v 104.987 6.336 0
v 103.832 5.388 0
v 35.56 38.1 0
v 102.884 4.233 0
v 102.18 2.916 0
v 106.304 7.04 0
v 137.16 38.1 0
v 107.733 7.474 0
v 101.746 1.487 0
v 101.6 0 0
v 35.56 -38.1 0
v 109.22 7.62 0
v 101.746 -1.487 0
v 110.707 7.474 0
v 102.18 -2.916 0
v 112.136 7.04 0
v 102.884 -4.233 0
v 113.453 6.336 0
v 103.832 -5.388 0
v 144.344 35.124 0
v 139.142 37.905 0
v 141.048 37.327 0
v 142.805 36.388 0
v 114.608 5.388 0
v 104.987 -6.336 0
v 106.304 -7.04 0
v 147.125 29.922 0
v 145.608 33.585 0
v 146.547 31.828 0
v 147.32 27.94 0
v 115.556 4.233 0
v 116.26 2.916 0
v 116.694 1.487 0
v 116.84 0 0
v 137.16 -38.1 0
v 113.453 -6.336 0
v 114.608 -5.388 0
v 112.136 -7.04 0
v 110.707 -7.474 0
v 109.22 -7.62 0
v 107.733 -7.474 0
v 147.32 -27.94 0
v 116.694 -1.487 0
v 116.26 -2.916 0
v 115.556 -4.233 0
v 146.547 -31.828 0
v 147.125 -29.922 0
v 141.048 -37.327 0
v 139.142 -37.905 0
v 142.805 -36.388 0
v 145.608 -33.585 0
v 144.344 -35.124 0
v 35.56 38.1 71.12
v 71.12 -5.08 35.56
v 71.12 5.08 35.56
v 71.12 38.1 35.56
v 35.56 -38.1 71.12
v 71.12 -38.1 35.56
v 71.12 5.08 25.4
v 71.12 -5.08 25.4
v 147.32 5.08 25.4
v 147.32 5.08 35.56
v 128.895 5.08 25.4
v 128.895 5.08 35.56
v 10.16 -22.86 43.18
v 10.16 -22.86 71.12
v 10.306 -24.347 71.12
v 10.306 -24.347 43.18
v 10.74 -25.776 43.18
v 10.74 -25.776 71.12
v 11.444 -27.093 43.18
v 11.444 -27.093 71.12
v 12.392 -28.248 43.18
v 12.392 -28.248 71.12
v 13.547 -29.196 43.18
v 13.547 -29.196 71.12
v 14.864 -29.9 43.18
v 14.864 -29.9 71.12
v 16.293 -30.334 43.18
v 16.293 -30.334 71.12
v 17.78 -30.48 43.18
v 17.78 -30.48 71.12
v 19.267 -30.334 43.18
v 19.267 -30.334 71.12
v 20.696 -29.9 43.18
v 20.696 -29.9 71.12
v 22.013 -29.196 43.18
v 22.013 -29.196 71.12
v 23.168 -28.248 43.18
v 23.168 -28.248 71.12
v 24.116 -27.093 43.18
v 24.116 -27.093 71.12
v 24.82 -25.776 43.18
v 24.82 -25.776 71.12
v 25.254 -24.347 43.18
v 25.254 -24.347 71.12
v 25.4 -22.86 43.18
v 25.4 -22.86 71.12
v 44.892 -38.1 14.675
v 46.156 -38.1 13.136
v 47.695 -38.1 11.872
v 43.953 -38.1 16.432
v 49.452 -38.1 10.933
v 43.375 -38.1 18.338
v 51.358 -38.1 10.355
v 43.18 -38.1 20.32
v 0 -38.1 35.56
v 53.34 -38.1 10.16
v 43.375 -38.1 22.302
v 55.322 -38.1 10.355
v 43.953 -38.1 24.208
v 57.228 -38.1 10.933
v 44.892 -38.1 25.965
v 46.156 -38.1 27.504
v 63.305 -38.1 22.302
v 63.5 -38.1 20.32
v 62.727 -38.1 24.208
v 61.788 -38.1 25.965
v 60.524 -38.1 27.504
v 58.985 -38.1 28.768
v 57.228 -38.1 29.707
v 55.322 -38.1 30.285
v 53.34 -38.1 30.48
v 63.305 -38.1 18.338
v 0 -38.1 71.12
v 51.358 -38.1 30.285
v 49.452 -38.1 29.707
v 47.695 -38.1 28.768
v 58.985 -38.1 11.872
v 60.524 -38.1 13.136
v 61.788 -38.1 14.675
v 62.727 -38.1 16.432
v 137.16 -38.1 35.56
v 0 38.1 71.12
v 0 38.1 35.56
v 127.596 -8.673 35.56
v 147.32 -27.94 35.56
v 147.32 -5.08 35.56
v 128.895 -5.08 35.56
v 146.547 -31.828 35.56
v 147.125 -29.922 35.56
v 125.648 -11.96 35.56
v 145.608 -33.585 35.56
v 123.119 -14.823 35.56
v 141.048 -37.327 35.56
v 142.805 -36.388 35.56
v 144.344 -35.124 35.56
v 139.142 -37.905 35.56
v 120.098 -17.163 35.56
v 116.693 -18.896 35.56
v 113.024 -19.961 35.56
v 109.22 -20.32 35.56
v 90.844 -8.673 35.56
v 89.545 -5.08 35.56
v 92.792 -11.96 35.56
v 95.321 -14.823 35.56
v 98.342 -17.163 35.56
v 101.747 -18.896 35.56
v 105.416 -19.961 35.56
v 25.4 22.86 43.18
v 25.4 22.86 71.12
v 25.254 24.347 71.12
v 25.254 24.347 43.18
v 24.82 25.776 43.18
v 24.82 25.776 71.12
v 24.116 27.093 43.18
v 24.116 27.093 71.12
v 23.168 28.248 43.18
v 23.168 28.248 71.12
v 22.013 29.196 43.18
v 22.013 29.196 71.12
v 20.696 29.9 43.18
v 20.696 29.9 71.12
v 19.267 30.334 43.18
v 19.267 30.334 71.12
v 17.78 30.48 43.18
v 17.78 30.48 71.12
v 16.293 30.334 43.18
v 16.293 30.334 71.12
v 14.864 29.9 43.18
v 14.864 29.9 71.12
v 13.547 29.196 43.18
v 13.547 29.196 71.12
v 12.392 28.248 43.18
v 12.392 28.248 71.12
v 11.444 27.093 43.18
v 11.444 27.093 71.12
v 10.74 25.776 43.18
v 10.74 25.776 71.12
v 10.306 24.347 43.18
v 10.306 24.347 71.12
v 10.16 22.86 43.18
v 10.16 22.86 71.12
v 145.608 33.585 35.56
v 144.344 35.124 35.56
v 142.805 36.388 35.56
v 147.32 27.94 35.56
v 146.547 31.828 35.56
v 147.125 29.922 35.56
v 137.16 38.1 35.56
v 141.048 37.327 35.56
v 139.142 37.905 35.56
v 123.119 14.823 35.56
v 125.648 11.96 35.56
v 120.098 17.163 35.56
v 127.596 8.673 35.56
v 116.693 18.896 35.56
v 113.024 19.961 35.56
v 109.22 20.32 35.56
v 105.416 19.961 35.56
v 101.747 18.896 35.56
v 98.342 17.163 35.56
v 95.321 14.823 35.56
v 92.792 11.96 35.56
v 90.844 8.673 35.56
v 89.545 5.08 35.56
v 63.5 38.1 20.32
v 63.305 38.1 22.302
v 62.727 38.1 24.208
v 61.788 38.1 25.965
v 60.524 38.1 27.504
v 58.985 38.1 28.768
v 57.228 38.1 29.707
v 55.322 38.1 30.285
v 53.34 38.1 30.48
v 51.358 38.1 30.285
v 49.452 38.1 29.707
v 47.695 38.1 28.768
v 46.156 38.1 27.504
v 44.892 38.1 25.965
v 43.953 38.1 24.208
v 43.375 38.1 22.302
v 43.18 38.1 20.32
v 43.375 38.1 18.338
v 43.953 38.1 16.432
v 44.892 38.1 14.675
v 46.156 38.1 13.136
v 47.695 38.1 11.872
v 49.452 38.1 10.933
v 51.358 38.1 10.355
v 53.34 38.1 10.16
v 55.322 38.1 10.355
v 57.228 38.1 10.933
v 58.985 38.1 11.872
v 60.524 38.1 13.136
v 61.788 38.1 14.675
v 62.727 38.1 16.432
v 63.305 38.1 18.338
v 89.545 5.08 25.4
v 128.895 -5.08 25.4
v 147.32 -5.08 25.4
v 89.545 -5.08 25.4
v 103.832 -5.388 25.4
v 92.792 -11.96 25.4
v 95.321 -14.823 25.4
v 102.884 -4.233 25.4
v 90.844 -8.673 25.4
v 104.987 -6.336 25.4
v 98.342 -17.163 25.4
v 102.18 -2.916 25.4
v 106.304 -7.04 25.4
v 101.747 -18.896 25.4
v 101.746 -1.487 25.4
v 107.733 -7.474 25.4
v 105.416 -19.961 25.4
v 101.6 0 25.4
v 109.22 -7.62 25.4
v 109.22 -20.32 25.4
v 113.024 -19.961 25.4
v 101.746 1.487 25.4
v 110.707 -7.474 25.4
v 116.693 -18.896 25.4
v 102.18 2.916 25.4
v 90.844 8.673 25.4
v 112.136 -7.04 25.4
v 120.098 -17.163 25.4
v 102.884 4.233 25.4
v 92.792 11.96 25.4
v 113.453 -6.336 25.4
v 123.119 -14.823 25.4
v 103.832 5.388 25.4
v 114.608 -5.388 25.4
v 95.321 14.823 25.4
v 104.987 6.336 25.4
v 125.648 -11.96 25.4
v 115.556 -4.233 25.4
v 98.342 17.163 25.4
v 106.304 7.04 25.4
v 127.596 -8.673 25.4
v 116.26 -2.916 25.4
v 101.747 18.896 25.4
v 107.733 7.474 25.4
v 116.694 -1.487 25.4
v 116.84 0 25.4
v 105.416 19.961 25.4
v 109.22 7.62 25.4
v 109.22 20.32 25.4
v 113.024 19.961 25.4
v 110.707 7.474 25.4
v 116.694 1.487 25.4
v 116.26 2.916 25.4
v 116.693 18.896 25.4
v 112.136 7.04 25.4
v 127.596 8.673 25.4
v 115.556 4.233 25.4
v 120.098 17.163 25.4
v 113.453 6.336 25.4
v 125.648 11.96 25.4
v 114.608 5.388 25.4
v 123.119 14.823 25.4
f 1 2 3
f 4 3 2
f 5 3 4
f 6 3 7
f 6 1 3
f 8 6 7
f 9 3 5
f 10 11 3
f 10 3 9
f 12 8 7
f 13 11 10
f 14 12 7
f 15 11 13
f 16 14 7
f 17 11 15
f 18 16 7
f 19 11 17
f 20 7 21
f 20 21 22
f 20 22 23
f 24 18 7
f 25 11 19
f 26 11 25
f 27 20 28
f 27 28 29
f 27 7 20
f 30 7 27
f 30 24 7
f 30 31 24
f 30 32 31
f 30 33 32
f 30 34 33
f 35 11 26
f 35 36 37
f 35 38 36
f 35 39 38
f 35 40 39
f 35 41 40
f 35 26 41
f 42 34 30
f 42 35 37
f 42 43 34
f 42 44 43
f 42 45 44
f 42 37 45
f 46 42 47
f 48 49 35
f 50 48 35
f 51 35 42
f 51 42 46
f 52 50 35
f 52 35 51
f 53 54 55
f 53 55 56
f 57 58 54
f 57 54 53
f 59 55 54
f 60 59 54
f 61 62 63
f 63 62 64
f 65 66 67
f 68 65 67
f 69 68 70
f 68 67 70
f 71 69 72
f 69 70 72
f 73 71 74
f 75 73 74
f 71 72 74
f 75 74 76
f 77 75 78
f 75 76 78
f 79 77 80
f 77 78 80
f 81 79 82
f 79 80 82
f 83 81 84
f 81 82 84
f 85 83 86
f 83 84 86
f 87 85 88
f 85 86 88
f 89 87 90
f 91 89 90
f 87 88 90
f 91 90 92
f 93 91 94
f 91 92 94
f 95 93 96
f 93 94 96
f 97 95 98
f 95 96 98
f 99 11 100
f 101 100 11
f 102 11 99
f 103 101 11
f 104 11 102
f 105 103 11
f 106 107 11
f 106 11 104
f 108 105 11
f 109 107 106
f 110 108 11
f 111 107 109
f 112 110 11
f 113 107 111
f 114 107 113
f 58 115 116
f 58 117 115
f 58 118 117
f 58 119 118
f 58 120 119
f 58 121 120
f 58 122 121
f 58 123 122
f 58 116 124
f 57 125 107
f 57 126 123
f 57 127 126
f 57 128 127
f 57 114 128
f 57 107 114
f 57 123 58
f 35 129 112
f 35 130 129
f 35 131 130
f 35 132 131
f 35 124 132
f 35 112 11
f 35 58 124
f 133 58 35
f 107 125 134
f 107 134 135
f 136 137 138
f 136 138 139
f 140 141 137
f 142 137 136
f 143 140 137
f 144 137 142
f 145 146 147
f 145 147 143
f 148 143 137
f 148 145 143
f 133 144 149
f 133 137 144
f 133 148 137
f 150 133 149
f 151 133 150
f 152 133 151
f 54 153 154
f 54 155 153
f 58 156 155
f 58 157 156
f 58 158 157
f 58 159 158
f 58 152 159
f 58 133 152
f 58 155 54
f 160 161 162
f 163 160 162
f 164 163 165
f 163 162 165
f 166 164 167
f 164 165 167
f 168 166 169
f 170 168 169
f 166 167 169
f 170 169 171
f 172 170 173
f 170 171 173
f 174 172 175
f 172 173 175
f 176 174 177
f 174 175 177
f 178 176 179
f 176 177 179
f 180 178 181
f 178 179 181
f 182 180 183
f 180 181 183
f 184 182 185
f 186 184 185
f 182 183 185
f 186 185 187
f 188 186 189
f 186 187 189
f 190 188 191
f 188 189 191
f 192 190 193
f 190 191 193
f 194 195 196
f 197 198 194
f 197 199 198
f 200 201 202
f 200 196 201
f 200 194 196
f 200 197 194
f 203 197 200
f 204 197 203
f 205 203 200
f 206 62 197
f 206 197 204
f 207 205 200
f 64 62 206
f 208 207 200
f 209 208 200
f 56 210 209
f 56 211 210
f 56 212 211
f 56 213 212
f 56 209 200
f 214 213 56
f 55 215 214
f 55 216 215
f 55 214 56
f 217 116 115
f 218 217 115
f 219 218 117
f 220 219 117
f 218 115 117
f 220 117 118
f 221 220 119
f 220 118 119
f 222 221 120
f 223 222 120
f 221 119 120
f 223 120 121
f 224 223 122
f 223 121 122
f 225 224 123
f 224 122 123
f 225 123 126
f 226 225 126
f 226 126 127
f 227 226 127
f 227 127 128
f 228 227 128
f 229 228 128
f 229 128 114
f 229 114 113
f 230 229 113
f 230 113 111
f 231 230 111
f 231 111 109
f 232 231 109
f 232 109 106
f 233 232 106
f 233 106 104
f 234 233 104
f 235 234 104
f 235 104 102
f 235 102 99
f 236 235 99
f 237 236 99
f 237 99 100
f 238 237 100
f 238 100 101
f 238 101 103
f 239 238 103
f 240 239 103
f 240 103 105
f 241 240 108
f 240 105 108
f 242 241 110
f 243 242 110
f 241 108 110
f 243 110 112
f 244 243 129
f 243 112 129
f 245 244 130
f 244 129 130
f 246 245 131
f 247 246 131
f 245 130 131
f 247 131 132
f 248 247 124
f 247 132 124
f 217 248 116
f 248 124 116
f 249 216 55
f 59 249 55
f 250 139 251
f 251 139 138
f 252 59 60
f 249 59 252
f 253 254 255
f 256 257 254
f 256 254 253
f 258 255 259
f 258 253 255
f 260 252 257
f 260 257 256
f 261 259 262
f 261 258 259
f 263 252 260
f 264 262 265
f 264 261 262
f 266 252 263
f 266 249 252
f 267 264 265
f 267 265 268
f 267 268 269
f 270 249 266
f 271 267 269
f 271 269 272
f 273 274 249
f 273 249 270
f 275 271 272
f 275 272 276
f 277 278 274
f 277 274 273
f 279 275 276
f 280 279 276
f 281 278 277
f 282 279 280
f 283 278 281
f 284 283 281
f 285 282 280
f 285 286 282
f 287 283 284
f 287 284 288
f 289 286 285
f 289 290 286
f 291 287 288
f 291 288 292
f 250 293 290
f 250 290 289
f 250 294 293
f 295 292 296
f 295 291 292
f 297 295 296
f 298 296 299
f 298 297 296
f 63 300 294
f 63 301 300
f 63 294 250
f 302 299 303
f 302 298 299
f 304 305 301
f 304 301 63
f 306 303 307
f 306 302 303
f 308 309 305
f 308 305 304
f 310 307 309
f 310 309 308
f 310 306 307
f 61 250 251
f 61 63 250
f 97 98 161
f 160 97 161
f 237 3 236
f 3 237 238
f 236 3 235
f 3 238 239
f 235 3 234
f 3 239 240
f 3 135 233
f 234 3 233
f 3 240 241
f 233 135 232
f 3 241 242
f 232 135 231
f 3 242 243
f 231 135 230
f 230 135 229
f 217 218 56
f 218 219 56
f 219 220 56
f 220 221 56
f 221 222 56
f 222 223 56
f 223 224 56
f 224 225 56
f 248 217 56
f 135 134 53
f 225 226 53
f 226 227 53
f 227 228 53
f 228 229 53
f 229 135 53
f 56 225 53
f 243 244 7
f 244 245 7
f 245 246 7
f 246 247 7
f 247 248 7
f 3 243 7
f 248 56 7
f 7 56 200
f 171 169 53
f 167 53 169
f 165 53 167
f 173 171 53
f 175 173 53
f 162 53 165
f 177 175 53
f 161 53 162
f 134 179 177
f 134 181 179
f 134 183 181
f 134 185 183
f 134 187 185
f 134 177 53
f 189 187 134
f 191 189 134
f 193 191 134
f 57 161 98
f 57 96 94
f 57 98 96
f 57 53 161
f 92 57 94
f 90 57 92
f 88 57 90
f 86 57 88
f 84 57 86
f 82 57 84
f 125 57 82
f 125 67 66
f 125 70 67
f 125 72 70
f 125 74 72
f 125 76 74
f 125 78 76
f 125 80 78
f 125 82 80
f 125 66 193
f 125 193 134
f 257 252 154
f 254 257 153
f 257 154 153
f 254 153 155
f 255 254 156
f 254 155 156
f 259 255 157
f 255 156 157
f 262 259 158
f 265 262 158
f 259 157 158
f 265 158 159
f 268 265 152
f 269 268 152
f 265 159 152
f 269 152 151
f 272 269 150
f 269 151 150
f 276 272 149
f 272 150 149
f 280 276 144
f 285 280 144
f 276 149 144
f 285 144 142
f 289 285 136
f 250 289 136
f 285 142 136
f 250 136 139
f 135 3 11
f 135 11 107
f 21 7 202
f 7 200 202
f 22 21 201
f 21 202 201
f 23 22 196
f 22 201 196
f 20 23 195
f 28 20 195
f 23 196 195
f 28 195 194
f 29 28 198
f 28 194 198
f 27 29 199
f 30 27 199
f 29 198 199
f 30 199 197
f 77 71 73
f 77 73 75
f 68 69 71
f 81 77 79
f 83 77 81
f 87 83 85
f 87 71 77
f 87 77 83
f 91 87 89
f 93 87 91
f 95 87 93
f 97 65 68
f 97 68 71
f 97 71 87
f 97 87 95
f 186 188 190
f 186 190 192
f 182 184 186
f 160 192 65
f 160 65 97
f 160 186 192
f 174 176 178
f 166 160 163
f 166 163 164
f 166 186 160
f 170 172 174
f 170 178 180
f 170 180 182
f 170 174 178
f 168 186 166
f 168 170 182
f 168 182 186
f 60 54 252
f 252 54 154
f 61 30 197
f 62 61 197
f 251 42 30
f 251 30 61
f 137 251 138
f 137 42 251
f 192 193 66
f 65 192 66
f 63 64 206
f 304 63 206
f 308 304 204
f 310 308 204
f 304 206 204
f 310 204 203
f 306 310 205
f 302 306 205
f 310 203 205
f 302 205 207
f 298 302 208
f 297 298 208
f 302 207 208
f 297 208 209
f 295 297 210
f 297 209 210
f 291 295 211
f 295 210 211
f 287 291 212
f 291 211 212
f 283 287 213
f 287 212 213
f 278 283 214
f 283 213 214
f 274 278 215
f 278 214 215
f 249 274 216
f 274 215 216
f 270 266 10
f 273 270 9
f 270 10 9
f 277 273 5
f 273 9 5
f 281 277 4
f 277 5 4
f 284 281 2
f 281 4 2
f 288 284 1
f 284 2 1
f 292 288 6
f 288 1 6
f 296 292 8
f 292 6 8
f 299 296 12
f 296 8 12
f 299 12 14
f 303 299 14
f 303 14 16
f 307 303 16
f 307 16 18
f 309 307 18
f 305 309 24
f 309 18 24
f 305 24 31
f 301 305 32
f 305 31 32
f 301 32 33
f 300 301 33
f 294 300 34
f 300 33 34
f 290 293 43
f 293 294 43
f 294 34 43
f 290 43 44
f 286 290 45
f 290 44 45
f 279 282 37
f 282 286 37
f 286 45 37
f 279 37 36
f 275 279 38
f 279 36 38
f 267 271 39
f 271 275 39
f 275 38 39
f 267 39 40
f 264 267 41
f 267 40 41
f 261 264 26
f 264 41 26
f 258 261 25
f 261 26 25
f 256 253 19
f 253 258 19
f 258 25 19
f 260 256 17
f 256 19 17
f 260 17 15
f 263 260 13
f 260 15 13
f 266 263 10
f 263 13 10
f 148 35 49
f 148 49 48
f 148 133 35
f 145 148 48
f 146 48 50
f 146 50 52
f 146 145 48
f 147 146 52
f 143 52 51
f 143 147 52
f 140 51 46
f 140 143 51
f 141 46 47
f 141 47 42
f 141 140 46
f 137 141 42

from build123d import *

# Parameters (mm, degrees)
F1_DEPTH       = 38.1
F3_DEPTH       = 76.201
F4_R           = 10.16
F6_DEPTH       = 27.94
F8_D           = 15.24
F8_CBORE_D     = 40.64
F8_CBORE_DEPTH = 10.16
F10_DEPTH      = 10.16
F11_R          = 10.16
F12_DEPTH      = 76.201


with BuildPart() as f1:
    # F0 (on Front) → F1 (new body, symmetric)
    with BuildSketch(Plane.XZ):
        Polygon((0, 71.12), (0, 0), (147.32, 0), (147.32, 35.56), (71.12, 35.56), (35.56, 71.12), align=None)
    extrude(amount=F1_DEPTH, both=True)

    # F2 (on face) → F3 (cut, through all)
    with BuildSketch(Plane.XZ.offset(38.1)):
        Polygon((0, 35.56), (0, 0), (35.56, 0), align=None)
    extrude(amount=-F3_DEPTH, mode=Mode.SUBTRACT)

    # F4
    f4_edges = [f1.edges().sort_by_distance(p)[0] for p in [
        (147.32, -38.1, 17.78),
        (147.32, 38.1, 17.78),
    ]]
    fillet(f4_edges, radius=F4_R)

    # F5 (on face) → F6 (cut)
    with BuildSketch(Plane.XY.offset(71.12)):
        with BuildLine():
            ThreePointArc((25.4, 22.86), (17.78, 30.48), (10.16, 22.86))
            Line((10.16, 22.86), (10.16, -22.86))
            ThreePointArc((10.16, -22.86), (17.78, -30.48), (25.4, -22.86))
            Line((25.4, -22.86), (25.4, 22.86))
        make_face()
    extrude(amount=-F6_DEPTH, mode=Mode.SUBTRACT)

    # F8 (through all)
    with Locations(Plane.XY.offset(35.56)):
        with Locations((109.22, 0)):
            CounterBoreHole(F8_D / 2, F8_CBORE_D / 2, F8_CBORE_DEPTH)

    # F9 (on face) → F10 (cut)
    with BuildSketch(Plane.XY.offset(35.56)):
        Polygon((71.12, 5.08), (71.12, 0), (71.12, -5.08), (147.32, -5.08), (147.32, 0), (147.32, 5.08), align=None)
    extrude(amount=-F10_DEPTH, mode=Mode.SUBTRACT)

    # F11 (on face) → F12 (cut, through all)
    with BuildSketch(Plane.XZ.offset(38.1)):
        with Locations((53.34, 20.32)):
            Circle(F11_R)
    extrude(amount=-F12_DEPTH, mode=Mode.SUBTRACT)


solid = f1.part
